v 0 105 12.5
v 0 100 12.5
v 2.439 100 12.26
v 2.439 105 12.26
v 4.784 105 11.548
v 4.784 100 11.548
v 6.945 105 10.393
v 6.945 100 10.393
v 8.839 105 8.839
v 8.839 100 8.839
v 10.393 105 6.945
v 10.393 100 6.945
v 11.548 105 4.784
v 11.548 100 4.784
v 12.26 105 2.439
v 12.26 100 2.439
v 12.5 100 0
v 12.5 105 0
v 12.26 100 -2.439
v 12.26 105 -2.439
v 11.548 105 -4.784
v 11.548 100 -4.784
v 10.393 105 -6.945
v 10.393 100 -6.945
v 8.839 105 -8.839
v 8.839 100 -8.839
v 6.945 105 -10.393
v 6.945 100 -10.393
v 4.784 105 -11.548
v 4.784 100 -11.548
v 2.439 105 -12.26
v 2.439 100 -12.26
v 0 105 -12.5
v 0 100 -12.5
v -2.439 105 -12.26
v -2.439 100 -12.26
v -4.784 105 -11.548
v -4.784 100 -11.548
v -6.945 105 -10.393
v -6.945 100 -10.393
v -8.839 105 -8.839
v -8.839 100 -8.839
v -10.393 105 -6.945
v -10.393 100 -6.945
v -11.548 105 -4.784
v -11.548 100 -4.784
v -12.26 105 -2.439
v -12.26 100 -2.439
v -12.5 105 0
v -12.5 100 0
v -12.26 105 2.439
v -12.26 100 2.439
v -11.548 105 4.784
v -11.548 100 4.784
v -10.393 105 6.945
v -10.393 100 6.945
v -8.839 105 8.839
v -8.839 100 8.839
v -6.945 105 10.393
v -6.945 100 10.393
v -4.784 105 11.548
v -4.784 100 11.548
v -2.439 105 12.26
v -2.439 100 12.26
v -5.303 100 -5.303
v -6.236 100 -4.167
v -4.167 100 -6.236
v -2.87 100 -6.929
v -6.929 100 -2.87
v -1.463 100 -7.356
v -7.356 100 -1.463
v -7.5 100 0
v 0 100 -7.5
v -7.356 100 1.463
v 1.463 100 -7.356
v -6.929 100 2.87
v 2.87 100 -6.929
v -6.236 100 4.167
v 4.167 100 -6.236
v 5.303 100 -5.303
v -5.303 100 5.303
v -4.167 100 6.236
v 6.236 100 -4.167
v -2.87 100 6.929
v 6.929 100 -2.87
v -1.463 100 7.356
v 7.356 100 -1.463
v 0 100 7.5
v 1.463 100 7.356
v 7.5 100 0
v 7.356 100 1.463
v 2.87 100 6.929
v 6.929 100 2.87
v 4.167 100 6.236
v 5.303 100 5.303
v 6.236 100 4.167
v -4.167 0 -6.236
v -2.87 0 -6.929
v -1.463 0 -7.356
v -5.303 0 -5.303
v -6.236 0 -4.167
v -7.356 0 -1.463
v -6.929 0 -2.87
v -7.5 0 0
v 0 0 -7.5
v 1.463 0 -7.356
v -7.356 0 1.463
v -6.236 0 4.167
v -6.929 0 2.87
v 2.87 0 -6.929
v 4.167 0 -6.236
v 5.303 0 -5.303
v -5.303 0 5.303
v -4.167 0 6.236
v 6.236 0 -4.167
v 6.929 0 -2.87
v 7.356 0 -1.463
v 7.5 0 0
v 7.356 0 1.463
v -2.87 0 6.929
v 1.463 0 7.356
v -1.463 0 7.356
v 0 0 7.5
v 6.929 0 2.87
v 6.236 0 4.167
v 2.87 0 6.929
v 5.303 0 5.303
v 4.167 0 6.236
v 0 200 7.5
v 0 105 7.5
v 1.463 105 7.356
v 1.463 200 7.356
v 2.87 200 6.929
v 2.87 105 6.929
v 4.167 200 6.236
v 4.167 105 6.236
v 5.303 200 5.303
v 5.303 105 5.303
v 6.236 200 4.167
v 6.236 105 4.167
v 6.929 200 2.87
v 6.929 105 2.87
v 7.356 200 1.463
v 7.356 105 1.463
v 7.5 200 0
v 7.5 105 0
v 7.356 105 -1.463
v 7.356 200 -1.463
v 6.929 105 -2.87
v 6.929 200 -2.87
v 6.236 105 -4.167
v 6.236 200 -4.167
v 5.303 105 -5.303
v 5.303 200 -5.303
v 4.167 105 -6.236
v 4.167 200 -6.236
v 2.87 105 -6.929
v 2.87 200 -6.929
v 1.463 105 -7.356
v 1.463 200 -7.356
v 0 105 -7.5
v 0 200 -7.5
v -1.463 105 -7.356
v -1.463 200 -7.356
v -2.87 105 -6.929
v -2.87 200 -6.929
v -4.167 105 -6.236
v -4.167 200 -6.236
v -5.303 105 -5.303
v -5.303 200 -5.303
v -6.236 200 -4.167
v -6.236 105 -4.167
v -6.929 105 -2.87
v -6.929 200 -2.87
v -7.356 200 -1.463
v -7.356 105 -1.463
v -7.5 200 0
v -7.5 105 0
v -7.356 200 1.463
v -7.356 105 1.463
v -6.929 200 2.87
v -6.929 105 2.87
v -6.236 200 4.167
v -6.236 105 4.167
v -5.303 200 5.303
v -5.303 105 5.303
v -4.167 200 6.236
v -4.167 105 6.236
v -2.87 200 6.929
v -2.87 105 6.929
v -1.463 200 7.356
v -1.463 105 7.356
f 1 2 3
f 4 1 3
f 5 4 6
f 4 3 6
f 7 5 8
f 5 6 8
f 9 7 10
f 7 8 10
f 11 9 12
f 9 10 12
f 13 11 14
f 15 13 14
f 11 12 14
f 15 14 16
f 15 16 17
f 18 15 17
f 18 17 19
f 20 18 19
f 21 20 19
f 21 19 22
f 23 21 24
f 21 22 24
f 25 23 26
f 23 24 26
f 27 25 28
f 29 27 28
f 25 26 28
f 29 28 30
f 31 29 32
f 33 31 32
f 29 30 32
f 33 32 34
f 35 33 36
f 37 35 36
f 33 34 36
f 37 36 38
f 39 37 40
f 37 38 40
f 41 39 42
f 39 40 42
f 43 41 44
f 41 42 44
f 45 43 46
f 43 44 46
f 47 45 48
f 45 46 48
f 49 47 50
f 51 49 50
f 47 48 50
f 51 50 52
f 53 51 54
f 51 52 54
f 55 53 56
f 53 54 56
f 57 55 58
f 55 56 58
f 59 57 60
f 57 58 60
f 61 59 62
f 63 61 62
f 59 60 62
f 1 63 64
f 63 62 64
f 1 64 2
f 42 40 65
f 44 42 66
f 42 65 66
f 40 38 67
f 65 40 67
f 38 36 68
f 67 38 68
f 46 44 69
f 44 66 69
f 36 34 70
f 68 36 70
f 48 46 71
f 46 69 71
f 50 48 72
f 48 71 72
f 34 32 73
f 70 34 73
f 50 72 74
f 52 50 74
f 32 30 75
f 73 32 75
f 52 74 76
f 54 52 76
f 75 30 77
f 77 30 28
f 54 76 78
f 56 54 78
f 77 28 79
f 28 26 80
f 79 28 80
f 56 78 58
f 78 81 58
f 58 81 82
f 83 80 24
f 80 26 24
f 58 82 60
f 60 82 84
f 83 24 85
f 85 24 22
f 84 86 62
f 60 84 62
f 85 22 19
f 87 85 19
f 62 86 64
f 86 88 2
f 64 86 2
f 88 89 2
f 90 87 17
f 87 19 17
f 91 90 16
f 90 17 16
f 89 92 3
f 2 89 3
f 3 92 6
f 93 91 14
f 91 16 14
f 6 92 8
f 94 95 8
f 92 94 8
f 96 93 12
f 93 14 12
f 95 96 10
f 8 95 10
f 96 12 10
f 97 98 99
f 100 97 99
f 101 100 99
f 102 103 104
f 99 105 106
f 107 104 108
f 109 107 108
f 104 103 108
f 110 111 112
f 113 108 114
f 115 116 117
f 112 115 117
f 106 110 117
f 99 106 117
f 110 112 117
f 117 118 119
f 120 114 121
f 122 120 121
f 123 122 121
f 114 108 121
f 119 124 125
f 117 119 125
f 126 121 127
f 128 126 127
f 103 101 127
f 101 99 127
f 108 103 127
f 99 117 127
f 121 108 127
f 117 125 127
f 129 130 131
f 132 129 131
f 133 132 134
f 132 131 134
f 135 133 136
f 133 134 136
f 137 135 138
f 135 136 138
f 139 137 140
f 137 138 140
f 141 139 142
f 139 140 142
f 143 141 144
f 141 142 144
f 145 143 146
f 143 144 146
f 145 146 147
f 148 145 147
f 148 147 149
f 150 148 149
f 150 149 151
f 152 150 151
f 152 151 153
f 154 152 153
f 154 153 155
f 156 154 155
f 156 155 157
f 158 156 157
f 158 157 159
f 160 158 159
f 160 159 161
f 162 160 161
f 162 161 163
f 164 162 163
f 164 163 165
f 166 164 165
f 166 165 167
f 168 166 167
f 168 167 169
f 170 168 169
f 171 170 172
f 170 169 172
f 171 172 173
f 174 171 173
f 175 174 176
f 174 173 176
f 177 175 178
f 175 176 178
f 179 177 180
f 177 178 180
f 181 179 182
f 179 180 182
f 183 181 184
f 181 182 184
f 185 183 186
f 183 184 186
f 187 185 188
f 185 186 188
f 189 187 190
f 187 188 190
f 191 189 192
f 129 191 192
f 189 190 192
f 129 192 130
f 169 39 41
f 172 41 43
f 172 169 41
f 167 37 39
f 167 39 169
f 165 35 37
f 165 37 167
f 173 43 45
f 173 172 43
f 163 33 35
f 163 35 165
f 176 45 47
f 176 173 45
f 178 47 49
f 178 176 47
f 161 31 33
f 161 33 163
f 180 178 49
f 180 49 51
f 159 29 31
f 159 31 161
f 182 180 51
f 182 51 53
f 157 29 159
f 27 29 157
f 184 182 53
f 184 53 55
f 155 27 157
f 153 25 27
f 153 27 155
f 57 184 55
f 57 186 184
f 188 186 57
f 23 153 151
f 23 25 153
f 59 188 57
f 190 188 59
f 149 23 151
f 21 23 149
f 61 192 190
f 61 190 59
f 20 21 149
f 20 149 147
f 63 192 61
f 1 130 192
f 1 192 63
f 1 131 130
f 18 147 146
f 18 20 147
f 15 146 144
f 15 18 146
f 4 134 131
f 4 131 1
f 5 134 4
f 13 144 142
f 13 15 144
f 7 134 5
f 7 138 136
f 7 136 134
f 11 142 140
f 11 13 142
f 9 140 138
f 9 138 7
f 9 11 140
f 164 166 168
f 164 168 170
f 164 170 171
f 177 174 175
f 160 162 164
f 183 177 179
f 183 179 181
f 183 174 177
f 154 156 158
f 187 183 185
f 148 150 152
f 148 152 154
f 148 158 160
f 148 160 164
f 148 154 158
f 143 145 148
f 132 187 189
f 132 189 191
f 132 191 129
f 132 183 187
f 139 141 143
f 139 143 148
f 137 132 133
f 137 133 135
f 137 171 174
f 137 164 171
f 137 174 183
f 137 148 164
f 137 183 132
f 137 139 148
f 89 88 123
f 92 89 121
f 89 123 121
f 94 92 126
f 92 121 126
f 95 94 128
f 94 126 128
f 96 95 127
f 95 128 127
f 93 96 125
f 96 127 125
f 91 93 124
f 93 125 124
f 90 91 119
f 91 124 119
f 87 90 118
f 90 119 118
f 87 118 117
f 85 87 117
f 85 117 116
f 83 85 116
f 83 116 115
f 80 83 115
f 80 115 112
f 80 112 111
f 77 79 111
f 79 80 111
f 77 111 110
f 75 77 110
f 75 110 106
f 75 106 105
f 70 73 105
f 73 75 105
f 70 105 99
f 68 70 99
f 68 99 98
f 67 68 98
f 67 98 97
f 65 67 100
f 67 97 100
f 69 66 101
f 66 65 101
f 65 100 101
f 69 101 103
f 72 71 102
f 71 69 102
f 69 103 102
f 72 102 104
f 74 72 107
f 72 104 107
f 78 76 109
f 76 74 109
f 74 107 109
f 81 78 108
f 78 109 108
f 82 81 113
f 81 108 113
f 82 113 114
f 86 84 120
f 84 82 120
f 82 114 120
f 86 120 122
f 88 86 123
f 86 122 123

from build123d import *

# Parameters (mm, degrees)
SKETCH1_R           = 7.5
BOSS_EXTRUDE1_DEPTH = 200
BOSS_EXTRUDE2_START = -100
SKETCH2_R           = 12.5
BOSS_EXTRUDE2_DEPTH = 5


with BuildPart() as part:
    # Sketch1 → Boss-Extrude1 (new body)
    with BuildSketch(Plane(origin=(0, 0, 0), x_dir=(1, 0, 0), z_dir=(0, 1, 0))):
        with Locations(Location((0, 0, 0), (0, 0, 270))):
            Circle(SKETCH1_R)
    extrude(amount=BOSS_EXTRUDE1_DEPTH)

    # Sketch2 → Boss-Extrude2 (add)
    with BuildSketch(Plane(origin=(0, 200, 0), x_dir=(1, 0, 0), z_dir=(0, 1, 0)).offset(BOSS_EXTRUDE2_START)):
        with Locations(Location((0, 0, 0), (0, 0, 270))):
            Circle(SKETCH2_R)
    extrude(amount=BOSS_EXTRUDE2_DEPTH)


solid = part.part
